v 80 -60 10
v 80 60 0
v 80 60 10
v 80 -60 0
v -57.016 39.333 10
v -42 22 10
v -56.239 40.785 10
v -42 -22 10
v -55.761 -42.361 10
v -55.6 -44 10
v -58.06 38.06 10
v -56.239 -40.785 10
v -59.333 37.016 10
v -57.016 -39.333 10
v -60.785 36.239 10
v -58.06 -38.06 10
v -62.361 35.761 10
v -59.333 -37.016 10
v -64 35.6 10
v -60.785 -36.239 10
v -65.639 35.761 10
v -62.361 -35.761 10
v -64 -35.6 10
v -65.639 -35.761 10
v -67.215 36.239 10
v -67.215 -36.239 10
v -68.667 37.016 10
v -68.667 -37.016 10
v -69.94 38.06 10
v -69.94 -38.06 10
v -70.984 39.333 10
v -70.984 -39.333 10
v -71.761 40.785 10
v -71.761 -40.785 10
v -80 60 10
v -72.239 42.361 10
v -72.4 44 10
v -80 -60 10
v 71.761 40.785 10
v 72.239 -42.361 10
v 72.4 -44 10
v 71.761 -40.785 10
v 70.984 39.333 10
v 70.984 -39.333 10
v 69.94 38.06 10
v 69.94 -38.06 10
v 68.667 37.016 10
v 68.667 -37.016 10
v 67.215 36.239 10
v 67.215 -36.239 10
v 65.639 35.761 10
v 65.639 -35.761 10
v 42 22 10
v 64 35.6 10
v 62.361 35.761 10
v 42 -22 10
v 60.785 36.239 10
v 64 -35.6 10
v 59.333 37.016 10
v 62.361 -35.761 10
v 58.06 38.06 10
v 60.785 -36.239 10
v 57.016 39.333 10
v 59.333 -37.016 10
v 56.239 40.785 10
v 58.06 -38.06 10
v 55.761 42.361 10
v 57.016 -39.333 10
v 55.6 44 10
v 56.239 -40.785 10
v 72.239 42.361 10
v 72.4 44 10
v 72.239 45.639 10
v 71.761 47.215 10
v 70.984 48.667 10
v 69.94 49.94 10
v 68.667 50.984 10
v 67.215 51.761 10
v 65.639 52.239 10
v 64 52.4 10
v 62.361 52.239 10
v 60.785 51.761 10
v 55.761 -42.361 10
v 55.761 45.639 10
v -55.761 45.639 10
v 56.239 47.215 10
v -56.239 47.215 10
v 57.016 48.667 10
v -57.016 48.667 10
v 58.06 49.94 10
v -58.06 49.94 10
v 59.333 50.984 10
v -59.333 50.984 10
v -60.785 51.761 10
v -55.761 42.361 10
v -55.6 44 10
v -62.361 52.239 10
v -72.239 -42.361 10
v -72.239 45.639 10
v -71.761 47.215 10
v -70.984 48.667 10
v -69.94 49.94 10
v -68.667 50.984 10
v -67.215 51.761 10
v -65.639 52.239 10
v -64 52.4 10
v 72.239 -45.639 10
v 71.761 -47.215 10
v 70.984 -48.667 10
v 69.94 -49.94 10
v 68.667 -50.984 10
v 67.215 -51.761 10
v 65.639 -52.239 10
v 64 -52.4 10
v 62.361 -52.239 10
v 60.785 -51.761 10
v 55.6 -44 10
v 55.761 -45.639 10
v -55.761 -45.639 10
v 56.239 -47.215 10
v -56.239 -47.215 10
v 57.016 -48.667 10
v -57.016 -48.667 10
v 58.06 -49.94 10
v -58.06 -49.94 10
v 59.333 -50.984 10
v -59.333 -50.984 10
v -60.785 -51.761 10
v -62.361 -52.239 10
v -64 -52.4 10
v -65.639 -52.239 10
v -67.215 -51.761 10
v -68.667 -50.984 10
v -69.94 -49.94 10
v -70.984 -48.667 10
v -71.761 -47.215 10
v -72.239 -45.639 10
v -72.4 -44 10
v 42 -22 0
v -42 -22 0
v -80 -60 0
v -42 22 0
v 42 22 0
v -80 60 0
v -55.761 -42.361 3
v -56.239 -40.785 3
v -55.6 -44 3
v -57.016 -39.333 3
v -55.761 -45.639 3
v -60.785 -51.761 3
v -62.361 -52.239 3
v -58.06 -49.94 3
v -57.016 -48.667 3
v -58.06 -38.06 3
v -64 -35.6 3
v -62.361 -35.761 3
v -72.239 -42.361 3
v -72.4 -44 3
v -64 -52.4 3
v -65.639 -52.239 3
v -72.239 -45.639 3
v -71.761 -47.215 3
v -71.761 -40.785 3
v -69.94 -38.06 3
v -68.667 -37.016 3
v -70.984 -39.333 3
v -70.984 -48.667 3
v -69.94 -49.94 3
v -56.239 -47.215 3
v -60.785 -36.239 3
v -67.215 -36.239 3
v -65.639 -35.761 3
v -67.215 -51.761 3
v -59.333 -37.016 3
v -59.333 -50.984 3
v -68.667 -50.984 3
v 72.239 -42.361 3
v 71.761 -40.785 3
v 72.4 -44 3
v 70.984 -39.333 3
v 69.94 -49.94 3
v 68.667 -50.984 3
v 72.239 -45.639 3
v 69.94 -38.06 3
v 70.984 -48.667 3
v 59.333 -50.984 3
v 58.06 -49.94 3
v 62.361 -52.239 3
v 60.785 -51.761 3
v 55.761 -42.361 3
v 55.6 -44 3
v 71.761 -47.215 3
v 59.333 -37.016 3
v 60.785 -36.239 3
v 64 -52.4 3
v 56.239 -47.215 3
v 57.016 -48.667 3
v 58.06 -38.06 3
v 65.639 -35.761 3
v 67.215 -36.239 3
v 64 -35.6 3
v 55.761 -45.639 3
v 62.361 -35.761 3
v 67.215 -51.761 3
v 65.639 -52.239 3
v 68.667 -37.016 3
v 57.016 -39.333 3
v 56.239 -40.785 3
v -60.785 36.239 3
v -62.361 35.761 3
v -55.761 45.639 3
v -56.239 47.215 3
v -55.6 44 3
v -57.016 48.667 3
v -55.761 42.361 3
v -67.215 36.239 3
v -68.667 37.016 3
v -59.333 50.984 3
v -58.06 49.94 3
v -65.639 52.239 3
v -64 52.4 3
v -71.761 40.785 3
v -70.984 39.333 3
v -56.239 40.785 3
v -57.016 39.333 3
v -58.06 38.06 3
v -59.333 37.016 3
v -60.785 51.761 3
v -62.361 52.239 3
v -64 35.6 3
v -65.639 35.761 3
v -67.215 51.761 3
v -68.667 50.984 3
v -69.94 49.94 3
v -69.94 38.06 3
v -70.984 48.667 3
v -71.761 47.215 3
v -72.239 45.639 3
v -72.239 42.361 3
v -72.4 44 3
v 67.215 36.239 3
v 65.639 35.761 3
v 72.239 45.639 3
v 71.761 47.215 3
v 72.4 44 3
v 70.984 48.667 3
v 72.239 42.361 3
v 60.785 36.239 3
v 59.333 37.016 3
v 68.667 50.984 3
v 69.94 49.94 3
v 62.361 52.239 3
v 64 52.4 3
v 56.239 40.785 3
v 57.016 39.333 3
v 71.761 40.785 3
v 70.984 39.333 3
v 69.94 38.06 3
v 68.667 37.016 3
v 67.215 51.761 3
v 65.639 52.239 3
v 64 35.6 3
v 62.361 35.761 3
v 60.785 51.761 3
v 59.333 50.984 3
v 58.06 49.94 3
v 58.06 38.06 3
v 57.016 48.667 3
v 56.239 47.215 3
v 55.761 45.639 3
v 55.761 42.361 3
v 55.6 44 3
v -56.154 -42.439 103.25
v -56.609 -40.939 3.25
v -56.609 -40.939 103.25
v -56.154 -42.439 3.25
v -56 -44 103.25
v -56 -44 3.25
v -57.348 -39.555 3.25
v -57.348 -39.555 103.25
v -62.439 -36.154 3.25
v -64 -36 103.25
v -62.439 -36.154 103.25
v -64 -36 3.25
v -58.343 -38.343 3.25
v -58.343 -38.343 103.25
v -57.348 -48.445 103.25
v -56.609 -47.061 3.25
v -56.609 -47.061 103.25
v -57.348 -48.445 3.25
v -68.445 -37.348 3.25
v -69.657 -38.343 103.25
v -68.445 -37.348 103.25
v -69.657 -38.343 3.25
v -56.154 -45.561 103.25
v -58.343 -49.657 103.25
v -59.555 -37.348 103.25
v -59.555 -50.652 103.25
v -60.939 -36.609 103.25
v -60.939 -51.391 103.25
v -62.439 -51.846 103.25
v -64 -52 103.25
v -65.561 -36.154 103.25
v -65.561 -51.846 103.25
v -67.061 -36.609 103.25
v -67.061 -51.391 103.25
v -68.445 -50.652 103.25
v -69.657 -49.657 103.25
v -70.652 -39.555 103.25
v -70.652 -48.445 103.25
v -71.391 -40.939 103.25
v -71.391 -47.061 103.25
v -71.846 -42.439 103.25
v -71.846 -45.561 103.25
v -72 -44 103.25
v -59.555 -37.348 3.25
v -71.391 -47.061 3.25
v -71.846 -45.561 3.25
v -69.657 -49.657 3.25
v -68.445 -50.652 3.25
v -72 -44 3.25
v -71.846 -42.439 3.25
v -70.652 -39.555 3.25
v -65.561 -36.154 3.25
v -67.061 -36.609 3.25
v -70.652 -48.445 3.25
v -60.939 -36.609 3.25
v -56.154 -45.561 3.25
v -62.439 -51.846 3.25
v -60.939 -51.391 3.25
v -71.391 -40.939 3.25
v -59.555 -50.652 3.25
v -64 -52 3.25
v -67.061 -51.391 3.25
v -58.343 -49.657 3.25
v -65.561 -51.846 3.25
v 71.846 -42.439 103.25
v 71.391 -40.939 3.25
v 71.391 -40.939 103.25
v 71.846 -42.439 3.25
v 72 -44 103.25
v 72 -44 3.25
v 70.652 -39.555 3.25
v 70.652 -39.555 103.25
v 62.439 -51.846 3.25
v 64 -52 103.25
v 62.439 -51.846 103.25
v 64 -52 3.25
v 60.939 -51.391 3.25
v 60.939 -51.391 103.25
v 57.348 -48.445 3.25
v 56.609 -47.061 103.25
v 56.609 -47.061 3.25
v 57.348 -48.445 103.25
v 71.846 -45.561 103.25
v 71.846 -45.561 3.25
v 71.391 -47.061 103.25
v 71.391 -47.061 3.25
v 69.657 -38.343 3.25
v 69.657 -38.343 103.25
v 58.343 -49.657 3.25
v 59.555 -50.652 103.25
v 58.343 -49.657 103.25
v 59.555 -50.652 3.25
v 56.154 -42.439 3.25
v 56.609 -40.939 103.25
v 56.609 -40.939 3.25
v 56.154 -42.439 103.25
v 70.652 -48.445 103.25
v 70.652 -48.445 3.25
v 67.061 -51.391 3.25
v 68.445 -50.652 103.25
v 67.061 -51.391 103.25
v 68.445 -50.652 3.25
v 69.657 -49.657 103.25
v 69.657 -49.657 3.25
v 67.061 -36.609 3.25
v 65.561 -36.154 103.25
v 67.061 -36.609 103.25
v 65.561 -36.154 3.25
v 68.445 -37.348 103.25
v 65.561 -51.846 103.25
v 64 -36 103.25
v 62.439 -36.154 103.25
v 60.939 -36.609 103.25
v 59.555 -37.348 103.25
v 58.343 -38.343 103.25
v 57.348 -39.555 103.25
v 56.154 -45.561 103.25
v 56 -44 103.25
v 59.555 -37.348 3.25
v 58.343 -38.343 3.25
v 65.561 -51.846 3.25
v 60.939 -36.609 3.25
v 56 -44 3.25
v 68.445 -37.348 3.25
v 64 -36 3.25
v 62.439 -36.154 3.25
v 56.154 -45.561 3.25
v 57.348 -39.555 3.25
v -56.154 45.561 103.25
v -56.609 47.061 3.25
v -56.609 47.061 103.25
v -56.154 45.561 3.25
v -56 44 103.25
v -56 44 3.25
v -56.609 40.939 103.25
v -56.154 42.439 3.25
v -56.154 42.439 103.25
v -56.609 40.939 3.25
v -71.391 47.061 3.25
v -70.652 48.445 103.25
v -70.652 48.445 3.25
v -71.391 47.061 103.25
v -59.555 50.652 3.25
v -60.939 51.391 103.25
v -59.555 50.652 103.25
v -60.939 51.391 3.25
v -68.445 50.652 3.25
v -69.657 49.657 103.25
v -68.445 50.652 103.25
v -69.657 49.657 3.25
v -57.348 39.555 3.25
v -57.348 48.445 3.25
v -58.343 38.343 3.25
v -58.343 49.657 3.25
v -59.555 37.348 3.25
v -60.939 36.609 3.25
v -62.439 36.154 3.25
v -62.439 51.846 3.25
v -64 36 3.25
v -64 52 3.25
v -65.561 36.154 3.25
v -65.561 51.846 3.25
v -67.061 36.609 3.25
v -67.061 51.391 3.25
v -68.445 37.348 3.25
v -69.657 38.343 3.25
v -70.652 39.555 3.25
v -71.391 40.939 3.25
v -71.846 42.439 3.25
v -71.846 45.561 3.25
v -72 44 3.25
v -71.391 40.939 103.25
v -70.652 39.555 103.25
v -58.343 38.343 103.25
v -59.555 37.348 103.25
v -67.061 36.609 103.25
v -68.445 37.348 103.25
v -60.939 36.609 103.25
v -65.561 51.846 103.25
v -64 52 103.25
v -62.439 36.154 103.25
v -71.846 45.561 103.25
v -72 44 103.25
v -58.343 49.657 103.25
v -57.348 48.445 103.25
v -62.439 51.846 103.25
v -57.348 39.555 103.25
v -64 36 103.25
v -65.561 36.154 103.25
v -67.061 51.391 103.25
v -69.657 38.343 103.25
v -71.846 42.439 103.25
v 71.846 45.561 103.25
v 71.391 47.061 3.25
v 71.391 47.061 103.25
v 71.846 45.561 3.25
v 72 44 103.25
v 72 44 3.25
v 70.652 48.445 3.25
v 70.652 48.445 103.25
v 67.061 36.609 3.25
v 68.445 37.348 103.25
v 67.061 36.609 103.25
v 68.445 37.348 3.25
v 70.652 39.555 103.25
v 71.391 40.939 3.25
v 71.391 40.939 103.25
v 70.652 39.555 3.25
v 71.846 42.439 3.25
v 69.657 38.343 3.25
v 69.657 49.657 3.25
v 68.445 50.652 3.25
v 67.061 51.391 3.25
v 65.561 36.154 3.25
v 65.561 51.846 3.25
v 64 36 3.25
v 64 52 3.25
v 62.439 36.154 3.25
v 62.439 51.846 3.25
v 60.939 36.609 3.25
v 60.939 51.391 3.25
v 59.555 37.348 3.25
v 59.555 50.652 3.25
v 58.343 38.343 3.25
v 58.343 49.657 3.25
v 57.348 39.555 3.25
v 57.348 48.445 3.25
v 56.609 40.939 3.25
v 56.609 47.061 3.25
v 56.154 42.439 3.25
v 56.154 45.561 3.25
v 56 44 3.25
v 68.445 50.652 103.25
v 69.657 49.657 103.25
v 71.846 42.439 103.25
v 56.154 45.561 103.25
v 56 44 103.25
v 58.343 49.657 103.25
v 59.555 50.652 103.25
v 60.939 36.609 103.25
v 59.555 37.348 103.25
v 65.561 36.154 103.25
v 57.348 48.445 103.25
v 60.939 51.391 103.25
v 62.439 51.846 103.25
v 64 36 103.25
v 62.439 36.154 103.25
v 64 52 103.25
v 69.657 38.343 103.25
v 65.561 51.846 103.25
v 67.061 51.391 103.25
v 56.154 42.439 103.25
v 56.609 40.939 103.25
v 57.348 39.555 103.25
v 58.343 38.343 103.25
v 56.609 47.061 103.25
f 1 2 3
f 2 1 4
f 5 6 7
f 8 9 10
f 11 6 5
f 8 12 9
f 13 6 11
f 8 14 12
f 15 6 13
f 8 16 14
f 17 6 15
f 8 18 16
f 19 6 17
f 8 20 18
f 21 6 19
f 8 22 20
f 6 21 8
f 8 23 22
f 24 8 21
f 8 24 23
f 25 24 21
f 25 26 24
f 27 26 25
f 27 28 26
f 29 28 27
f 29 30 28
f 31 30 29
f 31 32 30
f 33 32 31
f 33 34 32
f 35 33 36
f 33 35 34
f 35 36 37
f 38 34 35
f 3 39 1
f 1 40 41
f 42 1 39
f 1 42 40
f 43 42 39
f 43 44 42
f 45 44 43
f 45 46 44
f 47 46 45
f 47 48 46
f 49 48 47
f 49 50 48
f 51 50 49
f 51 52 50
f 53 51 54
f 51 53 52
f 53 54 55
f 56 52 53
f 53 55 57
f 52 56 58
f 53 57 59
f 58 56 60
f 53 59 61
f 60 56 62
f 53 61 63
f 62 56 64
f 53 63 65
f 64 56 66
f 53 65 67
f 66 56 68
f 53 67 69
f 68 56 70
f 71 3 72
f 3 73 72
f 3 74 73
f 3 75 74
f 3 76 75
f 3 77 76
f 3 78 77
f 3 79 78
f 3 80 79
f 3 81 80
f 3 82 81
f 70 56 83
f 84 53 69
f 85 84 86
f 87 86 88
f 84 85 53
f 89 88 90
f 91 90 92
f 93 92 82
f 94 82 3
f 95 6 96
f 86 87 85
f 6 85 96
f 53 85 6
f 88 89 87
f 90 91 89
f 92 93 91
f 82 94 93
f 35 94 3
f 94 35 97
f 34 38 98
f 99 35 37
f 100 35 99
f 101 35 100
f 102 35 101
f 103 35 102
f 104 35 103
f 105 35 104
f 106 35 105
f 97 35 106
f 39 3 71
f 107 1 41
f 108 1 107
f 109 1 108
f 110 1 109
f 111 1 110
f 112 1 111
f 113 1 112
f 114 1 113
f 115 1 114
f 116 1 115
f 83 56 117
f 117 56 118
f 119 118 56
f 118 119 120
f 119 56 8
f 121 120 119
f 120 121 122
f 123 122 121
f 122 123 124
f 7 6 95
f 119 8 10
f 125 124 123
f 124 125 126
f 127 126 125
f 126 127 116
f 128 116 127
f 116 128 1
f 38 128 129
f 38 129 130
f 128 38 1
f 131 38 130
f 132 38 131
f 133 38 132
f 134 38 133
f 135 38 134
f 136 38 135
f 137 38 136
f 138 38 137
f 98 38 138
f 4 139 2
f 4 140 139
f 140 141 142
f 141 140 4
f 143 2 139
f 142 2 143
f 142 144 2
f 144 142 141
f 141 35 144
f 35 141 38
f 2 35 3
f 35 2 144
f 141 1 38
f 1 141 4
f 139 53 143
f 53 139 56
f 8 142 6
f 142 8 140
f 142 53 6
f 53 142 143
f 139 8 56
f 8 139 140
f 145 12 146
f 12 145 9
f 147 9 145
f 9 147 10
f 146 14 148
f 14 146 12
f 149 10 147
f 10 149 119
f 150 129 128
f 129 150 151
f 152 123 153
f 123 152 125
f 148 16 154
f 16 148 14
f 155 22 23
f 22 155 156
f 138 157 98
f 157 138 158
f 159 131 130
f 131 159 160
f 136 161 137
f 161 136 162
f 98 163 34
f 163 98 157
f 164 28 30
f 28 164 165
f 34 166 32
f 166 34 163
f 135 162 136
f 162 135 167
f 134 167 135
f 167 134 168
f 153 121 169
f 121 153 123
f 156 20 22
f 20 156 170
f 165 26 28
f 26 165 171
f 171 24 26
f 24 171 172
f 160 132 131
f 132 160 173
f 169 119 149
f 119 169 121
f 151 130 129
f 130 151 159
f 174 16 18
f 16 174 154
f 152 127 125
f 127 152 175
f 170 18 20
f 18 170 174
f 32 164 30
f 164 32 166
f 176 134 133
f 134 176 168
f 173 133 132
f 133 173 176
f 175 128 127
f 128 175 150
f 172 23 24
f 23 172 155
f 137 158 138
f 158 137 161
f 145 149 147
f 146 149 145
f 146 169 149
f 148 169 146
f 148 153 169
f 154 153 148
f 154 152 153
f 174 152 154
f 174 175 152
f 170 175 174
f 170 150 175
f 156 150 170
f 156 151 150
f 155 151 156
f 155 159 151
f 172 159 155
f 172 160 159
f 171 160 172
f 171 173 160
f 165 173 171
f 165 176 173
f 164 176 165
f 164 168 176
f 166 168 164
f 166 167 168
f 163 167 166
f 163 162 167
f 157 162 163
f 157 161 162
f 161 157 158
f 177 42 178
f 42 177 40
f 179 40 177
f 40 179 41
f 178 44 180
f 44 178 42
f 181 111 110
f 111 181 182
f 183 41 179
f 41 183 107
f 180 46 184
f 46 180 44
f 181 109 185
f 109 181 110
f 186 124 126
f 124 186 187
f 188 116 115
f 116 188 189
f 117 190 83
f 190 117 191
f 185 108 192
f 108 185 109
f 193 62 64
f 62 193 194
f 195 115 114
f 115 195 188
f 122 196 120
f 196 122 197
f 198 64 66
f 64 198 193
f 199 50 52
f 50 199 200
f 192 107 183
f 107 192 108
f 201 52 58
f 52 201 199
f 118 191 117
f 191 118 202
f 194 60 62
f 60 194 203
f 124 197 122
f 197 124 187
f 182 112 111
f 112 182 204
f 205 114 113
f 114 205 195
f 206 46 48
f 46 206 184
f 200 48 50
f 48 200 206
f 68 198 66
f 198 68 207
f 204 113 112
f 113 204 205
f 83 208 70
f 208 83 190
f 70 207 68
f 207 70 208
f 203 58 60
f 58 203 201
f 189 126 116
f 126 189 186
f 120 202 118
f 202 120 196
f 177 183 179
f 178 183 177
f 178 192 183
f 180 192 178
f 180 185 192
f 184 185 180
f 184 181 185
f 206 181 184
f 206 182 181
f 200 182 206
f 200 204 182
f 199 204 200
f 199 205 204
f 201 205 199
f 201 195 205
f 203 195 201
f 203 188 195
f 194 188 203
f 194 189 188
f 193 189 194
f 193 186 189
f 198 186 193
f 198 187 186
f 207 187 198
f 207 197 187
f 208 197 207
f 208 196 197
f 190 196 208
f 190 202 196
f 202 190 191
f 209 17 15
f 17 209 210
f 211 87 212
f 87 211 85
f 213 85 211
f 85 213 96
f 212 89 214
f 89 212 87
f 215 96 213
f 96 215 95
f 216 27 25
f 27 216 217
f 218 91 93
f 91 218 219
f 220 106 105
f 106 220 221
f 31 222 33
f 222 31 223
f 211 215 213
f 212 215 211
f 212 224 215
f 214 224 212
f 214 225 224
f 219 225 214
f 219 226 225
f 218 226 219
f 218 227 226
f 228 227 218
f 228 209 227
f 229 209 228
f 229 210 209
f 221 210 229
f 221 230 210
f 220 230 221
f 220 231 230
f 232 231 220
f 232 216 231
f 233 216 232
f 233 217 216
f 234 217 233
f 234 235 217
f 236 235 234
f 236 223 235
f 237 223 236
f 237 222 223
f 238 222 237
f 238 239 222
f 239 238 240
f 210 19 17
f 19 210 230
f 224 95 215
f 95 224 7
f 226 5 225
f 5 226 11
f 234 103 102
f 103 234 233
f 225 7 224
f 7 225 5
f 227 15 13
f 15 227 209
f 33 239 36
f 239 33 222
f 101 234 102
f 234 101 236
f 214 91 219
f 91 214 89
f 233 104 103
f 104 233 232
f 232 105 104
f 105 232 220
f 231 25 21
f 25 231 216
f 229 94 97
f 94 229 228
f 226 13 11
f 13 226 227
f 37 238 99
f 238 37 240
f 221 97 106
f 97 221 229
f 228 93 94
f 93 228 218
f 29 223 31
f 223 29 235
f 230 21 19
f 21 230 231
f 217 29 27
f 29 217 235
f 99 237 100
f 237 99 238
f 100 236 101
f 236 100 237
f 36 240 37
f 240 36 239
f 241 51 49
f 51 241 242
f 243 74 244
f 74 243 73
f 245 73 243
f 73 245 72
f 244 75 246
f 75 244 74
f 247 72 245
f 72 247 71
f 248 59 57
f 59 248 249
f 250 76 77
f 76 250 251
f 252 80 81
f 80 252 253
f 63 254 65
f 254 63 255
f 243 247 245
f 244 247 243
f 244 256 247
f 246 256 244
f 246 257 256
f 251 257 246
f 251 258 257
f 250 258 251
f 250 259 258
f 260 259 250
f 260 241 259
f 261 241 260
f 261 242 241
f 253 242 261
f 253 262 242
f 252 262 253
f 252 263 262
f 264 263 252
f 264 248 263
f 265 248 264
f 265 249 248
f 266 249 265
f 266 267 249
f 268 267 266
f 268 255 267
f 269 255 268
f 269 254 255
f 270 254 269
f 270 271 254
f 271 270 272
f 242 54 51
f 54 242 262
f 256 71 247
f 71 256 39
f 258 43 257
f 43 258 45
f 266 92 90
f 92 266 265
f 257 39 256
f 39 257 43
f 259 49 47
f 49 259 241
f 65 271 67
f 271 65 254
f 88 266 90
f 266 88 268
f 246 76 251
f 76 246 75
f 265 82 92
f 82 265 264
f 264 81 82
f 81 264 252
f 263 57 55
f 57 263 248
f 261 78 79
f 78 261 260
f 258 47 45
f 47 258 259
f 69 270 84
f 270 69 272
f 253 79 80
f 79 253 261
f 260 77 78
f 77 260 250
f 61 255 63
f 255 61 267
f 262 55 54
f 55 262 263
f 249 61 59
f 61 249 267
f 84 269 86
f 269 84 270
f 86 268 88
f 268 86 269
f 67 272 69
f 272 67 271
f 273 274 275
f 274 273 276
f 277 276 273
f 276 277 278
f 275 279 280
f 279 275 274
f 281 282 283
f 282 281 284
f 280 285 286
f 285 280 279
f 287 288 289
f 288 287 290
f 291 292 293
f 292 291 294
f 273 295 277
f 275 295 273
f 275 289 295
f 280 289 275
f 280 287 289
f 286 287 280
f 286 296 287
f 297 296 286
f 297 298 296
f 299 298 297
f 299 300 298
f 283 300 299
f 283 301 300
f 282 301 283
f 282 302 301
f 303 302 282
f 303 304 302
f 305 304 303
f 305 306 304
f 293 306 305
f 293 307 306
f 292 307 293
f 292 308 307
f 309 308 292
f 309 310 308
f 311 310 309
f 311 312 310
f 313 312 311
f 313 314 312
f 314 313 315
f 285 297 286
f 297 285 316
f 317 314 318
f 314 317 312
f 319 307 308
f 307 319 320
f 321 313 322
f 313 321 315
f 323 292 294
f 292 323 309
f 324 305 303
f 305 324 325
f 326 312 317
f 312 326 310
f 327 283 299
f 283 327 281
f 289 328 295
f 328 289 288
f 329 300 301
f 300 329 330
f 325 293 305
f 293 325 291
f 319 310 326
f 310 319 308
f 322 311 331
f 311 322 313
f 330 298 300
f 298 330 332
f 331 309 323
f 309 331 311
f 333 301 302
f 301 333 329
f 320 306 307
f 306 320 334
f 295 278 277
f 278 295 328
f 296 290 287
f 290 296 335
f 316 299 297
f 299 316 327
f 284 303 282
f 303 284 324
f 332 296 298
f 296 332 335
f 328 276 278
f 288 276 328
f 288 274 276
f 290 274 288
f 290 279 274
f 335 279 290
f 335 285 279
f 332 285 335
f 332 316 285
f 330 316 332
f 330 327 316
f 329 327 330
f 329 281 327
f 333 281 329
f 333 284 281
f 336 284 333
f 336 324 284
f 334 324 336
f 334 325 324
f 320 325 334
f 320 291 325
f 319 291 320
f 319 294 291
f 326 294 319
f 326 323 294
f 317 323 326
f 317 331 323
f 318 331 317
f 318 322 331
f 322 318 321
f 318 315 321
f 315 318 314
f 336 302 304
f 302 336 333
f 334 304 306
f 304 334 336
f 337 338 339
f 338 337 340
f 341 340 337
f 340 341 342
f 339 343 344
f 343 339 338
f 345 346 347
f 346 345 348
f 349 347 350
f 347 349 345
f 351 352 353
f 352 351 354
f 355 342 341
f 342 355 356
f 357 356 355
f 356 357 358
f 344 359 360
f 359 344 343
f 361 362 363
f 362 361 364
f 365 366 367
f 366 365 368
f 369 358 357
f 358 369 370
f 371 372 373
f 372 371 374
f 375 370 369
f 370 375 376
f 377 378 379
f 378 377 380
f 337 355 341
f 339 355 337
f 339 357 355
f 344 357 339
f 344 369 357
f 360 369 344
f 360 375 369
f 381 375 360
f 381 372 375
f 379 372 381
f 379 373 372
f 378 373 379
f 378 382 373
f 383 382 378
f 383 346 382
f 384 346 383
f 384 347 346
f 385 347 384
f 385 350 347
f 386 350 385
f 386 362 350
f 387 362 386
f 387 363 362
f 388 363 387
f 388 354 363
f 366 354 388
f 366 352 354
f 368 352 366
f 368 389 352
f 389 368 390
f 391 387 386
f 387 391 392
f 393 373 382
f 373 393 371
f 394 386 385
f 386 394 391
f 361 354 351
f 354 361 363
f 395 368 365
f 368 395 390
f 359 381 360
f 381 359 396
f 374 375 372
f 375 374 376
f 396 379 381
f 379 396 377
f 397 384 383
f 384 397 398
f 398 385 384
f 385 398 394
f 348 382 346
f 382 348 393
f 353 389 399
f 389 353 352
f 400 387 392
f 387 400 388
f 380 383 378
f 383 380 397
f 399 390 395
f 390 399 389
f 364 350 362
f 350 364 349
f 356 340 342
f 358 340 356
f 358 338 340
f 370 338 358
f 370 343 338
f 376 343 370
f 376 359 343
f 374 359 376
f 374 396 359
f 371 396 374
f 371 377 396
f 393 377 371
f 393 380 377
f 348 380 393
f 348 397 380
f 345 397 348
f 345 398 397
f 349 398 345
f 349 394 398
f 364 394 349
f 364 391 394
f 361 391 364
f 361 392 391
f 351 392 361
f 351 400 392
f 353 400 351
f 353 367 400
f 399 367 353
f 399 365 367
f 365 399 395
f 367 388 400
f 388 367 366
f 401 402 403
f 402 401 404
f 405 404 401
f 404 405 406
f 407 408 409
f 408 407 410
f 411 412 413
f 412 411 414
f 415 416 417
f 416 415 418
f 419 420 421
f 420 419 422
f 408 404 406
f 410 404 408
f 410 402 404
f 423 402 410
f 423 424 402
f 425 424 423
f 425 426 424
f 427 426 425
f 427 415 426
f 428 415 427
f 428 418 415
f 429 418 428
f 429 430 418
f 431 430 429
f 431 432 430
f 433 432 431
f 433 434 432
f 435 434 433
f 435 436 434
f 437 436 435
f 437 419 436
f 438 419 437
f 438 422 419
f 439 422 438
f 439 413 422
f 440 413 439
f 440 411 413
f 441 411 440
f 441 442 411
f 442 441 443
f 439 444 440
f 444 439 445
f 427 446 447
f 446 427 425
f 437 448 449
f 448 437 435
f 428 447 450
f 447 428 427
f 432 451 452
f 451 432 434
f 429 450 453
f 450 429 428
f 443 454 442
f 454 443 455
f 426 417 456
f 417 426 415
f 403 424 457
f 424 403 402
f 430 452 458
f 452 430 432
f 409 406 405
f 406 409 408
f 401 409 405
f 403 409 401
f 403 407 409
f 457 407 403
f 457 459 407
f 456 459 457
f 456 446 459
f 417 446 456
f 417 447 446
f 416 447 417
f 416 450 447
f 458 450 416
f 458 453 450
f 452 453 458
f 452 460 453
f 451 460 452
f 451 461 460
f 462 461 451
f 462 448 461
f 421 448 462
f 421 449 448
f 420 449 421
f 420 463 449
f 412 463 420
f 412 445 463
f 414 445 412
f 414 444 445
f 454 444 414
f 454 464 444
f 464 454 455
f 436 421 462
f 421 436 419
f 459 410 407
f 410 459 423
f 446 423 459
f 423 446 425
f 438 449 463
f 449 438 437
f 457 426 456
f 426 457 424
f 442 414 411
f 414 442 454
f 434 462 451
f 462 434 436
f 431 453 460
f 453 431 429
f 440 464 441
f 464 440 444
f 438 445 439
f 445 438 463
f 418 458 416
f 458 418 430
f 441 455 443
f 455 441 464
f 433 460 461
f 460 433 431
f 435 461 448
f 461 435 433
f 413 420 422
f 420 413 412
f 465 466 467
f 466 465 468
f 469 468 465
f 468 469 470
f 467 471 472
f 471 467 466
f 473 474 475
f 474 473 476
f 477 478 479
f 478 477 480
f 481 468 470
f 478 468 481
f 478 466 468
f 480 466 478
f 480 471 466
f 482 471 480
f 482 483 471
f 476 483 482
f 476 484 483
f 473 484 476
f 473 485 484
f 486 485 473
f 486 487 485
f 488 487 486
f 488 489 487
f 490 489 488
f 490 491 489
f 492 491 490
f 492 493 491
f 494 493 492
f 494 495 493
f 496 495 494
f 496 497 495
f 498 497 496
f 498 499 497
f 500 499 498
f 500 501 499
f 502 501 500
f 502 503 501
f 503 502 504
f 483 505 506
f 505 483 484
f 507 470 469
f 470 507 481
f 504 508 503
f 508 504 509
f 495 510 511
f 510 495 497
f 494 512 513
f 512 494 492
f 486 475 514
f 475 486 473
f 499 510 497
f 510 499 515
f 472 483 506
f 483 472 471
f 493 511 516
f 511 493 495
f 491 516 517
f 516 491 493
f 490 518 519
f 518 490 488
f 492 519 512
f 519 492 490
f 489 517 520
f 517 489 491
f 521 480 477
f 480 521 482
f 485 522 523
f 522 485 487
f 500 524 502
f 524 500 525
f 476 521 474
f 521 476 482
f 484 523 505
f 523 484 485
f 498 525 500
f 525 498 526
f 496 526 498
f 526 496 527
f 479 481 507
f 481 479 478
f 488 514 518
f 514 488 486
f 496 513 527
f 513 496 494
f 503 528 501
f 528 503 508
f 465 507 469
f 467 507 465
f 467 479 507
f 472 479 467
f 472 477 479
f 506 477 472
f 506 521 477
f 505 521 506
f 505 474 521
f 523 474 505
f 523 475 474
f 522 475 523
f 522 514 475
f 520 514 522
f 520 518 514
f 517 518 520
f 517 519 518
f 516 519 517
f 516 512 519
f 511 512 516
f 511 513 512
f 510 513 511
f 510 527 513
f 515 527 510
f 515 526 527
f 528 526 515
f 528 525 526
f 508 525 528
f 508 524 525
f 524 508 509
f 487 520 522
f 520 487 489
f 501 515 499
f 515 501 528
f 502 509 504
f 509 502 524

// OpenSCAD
$fn = 32;

// ------------------------------------------------------------------------
// Frame with four posts: 160 x 120 mm frame, four d16 posts
// Every part is its own module, assembly() places them once.
// ------------------------------------------------------------------------

// --- part 1 ---
module base_frame() {
  difference() {
    translate([-80, -60, 0]) cube([160, 120, 10]);
    translate([-42, -22, -1]) cube([84, 44, 12]);
    translate([-64, -44, 3]) cylinder(h = 8, d = 16.8);
    translate([64, -44, 3]) cylinder(h = 8, d = 16.8);
    translate([-64, 44, 3]) cylinder(h = 8, d = 16.8);
    translate([64, 44, 3]) cylinder(h = 8, d = 16.8);
  }
}

// --- part 2 ---
module post1() {
  cylinder(h = 100, d = 16);
}

// --- part 3 ---
module post2() {
  cylinder(h = 100, d = 16);
}

// --- part 4 ---
module post3() {
  cylinder(h = 100, d = 16);
}

// --- part 5 ---
module post4() {
  cylinder(h = 100, d = 16);
}

// --- assembly ---
module assembly() {
  translate([0, 0, 0]) rotate([0, 0, 0]) base_frame();
  translate([-64, -44, 3.25]) rotate([0, 0, 0]) post1();
  translate([64, -44, 3.25]) rotate([0, 0, 0]) post2();
  translate([-64, 44, 3.25]) rotate([0, 0, 0]) post3();
  translate([64, 44, 3.25]) rotate([0, 0, 0]) post4();
}

assembly();
